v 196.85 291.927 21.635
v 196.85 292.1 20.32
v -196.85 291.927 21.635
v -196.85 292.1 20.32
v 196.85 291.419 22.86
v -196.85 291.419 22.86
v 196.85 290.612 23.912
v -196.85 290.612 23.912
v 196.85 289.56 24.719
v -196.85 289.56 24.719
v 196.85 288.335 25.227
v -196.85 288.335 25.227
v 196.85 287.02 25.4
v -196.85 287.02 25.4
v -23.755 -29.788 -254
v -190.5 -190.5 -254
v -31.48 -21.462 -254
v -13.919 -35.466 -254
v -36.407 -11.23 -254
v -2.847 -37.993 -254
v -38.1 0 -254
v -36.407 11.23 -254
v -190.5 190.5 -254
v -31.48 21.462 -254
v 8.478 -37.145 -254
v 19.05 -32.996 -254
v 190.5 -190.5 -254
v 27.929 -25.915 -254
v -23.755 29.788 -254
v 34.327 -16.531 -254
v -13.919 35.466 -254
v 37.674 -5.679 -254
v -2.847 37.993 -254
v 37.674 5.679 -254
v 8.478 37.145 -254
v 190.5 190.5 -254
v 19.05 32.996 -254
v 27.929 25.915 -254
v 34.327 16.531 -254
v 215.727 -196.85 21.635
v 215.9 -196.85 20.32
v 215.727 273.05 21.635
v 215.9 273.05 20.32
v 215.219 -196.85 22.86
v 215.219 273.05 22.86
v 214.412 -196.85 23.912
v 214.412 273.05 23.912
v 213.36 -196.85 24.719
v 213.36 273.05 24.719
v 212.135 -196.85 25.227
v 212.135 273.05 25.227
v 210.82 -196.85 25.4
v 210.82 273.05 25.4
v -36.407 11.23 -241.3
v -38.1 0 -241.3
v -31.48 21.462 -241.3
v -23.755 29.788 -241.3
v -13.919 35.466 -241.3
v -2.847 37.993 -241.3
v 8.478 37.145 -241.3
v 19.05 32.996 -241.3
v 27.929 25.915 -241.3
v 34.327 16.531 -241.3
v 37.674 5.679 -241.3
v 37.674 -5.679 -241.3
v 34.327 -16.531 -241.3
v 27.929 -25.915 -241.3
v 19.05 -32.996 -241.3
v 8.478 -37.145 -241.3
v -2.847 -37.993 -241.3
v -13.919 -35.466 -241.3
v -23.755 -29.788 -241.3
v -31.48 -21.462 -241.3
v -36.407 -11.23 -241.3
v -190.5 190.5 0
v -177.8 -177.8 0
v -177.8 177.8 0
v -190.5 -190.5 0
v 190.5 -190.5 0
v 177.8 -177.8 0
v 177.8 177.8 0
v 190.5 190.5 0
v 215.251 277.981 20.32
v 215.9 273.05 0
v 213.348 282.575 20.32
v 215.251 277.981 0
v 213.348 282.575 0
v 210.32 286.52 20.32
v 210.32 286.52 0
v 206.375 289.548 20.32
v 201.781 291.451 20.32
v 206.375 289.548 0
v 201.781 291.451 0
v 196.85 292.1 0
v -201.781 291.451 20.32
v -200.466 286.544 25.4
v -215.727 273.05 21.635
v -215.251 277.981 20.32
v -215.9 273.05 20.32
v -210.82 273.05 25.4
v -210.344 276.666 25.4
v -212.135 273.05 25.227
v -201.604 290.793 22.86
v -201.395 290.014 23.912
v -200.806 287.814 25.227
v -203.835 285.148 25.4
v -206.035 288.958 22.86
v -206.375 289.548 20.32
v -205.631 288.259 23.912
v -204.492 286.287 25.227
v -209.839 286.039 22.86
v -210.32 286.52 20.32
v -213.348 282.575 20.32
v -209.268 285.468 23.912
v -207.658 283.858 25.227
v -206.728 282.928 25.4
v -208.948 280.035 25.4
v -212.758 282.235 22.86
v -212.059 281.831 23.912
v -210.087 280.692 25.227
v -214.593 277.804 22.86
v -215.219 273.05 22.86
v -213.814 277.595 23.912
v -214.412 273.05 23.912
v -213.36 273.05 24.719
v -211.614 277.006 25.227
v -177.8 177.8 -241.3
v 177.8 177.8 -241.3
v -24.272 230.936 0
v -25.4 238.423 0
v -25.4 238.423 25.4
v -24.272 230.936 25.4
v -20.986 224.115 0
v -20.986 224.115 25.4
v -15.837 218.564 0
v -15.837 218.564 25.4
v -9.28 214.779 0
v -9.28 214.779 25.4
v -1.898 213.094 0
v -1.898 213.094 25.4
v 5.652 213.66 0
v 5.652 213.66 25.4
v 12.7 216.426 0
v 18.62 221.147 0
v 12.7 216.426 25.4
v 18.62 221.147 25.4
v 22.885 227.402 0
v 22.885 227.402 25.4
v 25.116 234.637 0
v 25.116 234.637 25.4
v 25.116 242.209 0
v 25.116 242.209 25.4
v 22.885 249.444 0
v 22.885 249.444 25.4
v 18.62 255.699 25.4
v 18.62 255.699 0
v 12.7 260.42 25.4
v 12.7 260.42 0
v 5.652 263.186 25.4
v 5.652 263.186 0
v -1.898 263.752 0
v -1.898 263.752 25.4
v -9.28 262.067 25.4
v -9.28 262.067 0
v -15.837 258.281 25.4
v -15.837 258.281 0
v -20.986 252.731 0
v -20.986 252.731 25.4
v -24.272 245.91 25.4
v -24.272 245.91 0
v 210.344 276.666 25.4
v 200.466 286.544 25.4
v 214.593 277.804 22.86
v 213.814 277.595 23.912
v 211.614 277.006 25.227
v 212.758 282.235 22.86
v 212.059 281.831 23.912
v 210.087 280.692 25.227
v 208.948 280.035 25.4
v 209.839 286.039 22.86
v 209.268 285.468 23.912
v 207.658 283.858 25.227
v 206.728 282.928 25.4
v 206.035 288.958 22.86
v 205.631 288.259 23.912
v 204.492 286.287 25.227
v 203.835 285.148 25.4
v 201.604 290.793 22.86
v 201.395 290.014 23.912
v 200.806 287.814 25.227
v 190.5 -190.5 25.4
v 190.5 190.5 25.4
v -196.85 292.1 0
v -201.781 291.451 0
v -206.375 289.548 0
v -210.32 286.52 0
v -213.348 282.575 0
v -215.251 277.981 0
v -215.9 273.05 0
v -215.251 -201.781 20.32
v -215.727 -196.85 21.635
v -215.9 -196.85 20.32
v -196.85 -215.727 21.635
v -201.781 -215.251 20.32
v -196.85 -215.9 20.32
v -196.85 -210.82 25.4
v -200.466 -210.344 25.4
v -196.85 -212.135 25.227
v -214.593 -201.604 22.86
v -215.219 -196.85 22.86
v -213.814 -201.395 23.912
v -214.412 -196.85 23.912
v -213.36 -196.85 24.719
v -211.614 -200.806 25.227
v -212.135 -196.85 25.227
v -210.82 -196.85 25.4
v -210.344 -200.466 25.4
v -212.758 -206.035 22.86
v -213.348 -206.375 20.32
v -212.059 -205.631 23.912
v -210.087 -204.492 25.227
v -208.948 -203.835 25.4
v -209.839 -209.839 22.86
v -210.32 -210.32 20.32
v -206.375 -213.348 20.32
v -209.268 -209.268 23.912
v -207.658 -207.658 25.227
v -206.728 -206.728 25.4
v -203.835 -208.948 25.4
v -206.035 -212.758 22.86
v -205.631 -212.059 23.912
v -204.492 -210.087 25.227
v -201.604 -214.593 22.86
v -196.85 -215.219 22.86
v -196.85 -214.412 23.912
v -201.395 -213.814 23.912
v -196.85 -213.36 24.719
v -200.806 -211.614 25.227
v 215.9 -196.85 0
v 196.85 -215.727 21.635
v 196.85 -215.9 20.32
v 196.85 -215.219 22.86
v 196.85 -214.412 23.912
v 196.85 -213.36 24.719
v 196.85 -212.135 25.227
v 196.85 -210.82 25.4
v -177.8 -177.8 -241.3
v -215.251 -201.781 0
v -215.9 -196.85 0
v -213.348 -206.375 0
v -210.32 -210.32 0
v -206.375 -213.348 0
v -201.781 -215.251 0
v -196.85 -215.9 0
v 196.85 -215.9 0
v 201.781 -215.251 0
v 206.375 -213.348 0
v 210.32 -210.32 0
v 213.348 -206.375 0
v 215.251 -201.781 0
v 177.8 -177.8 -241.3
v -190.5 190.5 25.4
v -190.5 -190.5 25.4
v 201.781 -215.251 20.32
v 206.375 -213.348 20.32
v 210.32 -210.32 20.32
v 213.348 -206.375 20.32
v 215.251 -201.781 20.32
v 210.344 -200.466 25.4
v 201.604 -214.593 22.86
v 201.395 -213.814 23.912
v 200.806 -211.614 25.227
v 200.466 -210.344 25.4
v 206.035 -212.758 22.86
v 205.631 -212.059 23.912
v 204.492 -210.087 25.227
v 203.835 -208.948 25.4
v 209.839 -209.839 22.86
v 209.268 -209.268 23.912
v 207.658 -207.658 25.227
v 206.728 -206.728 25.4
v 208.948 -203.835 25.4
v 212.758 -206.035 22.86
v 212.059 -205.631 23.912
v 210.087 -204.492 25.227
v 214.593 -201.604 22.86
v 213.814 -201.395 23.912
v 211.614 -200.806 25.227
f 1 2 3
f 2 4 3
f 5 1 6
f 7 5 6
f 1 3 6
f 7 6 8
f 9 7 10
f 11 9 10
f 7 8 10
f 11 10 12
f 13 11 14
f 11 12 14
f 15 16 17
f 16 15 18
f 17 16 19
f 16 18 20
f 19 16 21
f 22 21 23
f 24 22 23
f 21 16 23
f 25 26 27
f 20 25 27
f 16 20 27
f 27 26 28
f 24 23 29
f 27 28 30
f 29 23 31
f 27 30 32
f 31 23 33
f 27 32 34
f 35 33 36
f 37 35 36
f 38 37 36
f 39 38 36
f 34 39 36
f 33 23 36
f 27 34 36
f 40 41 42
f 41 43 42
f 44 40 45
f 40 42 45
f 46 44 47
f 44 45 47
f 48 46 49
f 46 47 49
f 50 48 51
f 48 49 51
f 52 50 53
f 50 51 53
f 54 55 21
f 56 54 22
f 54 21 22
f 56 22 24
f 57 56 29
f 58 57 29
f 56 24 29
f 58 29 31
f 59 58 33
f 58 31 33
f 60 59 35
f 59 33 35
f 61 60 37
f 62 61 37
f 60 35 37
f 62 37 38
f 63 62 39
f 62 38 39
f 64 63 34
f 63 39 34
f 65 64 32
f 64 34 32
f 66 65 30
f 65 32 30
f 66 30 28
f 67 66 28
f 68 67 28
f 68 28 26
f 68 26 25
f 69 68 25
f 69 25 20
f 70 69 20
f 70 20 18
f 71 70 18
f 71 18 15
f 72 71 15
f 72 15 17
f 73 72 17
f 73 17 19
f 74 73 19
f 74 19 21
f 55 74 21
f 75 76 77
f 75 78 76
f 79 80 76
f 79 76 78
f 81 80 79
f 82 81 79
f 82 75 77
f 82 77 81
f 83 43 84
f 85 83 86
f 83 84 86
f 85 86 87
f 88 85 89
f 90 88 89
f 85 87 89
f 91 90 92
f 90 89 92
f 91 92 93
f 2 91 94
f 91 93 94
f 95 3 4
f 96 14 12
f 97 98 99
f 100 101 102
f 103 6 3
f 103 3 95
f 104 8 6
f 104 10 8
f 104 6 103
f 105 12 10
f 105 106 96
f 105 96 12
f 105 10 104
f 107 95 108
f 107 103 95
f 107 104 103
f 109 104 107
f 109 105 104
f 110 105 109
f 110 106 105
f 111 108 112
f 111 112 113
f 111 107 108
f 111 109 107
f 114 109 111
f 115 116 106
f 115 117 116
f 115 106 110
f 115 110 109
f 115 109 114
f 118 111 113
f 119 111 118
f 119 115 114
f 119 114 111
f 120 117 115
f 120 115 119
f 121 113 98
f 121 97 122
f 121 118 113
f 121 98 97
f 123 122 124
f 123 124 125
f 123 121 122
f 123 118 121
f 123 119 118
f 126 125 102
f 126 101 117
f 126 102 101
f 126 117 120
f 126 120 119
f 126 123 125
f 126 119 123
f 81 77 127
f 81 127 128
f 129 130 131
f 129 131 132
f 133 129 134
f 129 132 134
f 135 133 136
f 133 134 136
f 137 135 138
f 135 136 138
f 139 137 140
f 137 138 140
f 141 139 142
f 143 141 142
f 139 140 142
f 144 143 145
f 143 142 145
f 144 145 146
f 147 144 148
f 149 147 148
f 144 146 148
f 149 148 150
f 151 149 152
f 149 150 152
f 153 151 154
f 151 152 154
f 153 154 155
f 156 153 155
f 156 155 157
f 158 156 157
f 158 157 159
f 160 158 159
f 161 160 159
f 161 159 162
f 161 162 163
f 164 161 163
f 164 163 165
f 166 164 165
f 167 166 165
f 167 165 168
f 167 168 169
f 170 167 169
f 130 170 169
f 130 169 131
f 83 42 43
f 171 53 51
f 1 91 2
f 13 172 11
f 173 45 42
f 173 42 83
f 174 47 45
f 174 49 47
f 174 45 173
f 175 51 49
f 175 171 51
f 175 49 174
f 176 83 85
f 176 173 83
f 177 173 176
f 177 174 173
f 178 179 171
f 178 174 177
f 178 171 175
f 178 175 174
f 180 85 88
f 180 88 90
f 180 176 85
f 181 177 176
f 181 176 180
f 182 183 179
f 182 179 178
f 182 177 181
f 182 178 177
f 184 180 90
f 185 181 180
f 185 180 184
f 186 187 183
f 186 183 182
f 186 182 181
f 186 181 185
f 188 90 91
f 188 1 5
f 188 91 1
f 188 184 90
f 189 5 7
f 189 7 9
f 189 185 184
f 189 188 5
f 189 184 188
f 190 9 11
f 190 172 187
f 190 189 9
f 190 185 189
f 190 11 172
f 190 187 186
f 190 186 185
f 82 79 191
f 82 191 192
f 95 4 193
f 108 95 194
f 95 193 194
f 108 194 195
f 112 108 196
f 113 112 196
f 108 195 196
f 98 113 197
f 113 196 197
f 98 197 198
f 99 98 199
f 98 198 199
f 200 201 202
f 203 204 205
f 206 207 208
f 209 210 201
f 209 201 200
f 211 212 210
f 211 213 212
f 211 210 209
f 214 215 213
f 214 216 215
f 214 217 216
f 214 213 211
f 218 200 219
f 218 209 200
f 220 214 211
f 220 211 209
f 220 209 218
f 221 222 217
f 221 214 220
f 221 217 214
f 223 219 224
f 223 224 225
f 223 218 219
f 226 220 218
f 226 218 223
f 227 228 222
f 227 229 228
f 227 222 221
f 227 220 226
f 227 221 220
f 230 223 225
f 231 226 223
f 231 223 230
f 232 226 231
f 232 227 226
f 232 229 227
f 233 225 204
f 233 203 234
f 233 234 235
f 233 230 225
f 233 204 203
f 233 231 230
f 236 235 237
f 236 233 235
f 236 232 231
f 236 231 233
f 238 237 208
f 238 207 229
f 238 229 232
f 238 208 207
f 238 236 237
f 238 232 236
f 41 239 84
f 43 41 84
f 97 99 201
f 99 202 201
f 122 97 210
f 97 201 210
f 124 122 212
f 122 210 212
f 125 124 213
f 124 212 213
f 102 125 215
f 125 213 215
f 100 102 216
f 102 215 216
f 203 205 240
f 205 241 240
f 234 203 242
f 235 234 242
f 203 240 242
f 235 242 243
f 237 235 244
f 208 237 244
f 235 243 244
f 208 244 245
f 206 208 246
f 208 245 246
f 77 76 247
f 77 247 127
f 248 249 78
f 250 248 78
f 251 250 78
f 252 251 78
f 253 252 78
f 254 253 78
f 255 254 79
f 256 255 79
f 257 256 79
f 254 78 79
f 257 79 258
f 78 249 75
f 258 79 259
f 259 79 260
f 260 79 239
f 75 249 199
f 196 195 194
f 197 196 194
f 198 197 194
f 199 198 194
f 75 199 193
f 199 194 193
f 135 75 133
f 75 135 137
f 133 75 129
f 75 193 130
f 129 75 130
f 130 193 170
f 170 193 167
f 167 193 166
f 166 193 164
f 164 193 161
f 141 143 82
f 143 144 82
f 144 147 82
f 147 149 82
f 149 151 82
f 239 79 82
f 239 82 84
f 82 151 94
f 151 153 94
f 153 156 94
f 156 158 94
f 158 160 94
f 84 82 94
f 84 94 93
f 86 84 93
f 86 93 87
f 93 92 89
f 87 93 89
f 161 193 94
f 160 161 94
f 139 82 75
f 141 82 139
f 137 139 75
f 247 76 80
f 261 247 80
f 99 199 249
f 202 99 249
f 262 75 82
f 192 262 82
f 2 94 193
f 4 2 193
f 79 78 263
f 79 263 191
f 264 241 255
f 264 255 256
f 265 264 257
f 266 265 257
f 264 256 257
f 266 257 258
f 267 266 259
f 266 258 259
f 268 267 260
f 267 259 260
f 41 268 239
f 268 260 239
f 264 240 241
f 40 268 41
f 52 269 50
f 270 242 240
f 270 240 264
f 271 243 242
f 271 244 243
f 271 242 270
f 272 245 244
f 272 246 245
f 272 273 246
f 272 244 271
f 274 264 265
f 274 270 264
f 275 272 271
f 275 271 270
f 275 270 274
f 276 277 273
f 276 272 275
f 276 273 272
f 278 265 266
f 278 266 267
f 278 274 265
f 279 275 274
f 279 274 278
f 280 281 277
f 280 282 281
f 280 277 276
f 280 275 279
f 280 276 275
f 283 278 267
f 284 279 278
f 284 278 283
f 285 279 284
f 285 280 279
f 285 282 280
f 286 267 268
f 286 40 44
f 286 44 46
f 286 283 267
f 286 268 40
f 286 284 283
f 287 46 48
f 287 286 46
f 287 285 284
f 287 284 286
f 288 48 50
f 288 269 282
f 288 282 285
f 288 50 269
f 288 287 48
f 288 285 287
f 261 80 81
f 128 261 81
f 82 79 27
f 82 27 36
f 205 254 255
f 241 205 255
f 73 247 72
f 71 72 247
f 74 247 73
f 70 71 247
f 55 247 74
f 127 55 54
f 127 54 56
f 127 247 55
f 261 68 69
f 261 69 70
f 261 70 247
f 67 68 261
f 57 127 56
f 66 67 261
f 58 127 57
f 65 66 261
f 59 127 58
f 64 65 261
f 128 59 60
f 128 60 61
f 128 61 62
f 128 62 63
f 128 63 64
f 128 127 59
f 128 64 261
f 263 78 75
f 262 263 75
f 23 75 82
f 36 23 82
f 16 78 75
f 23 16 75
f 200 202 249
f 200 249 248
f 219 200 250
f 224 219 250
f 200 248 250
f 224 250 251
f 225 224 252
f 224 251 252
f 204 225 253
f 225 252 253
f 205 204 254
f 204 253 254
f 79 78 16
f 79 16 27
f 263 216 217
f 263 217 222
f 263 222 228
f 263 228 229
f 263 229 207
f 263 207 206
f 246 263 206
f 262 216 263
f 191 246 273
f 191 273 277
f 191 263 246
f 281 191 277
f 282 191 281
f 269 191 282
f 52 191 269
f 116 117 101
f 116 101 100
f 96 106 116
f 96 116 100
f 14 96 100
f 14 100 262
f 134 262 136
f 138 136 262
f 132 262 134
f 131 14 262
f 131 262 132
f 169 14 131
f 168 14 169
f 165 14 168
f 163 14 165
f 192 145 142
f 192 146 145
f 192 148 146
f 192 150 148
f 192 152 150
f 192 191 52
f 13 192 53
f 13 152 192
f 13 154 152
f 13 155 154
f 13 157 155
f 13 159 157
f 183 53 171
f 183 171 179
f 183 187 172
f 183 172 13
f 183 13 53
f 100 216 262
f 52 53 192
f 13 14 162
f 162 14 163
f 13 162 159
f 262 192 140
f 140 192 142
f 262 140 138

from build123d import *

# Parameters (mm, degrees)
F1_W     = 381
F1_H     = 381
F4_DEPTH = 254
F2_W     = 381
F2_H     = 381
F5_DEPTH = 25.4
F6_R     = 5.08
F7_D     = 50.8
F8_T     = -12.7
F9_D     = 76.2


with BuildPart() as f4:
    # F1 (on Top) → F4 (new body)
    with BuildSketch(Plane.XY):
        Rectangle(F1_W, F1_H)
    extrude(amount=-F4_DEPTH)

    # F8
    f8_openings = [f4.faces().sort_by_distance(p)[0] for p in [
        (0, 0, 0),
    ]]
    offset(amount=F8_T, openings=f8_openings)

    # F9 (through all)
    with Locations(Plane.XY):
        with Locations((0, 0)):
            Hole(F9_D / 2)


with BuildPart() as f5:
    # F2 (on face) → F5 (new body)
    with BuildSketch(Plane.XY):
        with BuildLine():
            Line((196.85, 292.1), (-196.85, 292.1))
            ThreePointArc((-196.85, 292.1), (-210.3203841816, 286.5203841816), (-215.9, 273.05))
            Line((-215.9, 273.05), (-215.9, -196.85))
            ThreePointArc((-215.9, -196.85), (-210.3203841816, -210.3203841816), (-196.85, -215.9))
            Line((-196.85, -215.9), (196.85, -215.9))
            ThreePointArc((196.85, -215.9), (210.3203841816, -210.3203841816), (215.9, -196.85))
            Line((215.9, -196.85), (215.9, 273.05))
            ThreePointArc((215.9, 273.05), (210.3203841816, 286.5203841816), (196.85, 292.1))
        make_face()
        Rectangle(F2_W, F2_H, mode=Mode.SUBTRACT)
    extrude(amount=F5_DEPTH)

    # F6
    f6_edges = [f5.edges().sort_by_distance(p)[0] for p in [
        (-215.9, 38.1, 25.4),
        (-210.320384, 286.520384, 25.4),
        (0, 292.1, 25.4),
        (210.320384, 286.520384, 25.4),
        (215.9, 38.1, 25.4),
        (210.320384, -210.320384, 25.4),
        (0, -215.9, 25.4),
        (-210.320384, -210.320384, 25.4),
    ]]
    fillet(f6_edges, radius=F6_R)

    # F7 (through all)
    with Locations(Plane(origin=(0, 0, 0), x_dir=(1, 0, 0), z_dir=(0, 0, -1))):
        with Locations((0, -238.4229451418)):
            Hole(F7_D / 2)


solid = Compound([f4.part, f5.part])
